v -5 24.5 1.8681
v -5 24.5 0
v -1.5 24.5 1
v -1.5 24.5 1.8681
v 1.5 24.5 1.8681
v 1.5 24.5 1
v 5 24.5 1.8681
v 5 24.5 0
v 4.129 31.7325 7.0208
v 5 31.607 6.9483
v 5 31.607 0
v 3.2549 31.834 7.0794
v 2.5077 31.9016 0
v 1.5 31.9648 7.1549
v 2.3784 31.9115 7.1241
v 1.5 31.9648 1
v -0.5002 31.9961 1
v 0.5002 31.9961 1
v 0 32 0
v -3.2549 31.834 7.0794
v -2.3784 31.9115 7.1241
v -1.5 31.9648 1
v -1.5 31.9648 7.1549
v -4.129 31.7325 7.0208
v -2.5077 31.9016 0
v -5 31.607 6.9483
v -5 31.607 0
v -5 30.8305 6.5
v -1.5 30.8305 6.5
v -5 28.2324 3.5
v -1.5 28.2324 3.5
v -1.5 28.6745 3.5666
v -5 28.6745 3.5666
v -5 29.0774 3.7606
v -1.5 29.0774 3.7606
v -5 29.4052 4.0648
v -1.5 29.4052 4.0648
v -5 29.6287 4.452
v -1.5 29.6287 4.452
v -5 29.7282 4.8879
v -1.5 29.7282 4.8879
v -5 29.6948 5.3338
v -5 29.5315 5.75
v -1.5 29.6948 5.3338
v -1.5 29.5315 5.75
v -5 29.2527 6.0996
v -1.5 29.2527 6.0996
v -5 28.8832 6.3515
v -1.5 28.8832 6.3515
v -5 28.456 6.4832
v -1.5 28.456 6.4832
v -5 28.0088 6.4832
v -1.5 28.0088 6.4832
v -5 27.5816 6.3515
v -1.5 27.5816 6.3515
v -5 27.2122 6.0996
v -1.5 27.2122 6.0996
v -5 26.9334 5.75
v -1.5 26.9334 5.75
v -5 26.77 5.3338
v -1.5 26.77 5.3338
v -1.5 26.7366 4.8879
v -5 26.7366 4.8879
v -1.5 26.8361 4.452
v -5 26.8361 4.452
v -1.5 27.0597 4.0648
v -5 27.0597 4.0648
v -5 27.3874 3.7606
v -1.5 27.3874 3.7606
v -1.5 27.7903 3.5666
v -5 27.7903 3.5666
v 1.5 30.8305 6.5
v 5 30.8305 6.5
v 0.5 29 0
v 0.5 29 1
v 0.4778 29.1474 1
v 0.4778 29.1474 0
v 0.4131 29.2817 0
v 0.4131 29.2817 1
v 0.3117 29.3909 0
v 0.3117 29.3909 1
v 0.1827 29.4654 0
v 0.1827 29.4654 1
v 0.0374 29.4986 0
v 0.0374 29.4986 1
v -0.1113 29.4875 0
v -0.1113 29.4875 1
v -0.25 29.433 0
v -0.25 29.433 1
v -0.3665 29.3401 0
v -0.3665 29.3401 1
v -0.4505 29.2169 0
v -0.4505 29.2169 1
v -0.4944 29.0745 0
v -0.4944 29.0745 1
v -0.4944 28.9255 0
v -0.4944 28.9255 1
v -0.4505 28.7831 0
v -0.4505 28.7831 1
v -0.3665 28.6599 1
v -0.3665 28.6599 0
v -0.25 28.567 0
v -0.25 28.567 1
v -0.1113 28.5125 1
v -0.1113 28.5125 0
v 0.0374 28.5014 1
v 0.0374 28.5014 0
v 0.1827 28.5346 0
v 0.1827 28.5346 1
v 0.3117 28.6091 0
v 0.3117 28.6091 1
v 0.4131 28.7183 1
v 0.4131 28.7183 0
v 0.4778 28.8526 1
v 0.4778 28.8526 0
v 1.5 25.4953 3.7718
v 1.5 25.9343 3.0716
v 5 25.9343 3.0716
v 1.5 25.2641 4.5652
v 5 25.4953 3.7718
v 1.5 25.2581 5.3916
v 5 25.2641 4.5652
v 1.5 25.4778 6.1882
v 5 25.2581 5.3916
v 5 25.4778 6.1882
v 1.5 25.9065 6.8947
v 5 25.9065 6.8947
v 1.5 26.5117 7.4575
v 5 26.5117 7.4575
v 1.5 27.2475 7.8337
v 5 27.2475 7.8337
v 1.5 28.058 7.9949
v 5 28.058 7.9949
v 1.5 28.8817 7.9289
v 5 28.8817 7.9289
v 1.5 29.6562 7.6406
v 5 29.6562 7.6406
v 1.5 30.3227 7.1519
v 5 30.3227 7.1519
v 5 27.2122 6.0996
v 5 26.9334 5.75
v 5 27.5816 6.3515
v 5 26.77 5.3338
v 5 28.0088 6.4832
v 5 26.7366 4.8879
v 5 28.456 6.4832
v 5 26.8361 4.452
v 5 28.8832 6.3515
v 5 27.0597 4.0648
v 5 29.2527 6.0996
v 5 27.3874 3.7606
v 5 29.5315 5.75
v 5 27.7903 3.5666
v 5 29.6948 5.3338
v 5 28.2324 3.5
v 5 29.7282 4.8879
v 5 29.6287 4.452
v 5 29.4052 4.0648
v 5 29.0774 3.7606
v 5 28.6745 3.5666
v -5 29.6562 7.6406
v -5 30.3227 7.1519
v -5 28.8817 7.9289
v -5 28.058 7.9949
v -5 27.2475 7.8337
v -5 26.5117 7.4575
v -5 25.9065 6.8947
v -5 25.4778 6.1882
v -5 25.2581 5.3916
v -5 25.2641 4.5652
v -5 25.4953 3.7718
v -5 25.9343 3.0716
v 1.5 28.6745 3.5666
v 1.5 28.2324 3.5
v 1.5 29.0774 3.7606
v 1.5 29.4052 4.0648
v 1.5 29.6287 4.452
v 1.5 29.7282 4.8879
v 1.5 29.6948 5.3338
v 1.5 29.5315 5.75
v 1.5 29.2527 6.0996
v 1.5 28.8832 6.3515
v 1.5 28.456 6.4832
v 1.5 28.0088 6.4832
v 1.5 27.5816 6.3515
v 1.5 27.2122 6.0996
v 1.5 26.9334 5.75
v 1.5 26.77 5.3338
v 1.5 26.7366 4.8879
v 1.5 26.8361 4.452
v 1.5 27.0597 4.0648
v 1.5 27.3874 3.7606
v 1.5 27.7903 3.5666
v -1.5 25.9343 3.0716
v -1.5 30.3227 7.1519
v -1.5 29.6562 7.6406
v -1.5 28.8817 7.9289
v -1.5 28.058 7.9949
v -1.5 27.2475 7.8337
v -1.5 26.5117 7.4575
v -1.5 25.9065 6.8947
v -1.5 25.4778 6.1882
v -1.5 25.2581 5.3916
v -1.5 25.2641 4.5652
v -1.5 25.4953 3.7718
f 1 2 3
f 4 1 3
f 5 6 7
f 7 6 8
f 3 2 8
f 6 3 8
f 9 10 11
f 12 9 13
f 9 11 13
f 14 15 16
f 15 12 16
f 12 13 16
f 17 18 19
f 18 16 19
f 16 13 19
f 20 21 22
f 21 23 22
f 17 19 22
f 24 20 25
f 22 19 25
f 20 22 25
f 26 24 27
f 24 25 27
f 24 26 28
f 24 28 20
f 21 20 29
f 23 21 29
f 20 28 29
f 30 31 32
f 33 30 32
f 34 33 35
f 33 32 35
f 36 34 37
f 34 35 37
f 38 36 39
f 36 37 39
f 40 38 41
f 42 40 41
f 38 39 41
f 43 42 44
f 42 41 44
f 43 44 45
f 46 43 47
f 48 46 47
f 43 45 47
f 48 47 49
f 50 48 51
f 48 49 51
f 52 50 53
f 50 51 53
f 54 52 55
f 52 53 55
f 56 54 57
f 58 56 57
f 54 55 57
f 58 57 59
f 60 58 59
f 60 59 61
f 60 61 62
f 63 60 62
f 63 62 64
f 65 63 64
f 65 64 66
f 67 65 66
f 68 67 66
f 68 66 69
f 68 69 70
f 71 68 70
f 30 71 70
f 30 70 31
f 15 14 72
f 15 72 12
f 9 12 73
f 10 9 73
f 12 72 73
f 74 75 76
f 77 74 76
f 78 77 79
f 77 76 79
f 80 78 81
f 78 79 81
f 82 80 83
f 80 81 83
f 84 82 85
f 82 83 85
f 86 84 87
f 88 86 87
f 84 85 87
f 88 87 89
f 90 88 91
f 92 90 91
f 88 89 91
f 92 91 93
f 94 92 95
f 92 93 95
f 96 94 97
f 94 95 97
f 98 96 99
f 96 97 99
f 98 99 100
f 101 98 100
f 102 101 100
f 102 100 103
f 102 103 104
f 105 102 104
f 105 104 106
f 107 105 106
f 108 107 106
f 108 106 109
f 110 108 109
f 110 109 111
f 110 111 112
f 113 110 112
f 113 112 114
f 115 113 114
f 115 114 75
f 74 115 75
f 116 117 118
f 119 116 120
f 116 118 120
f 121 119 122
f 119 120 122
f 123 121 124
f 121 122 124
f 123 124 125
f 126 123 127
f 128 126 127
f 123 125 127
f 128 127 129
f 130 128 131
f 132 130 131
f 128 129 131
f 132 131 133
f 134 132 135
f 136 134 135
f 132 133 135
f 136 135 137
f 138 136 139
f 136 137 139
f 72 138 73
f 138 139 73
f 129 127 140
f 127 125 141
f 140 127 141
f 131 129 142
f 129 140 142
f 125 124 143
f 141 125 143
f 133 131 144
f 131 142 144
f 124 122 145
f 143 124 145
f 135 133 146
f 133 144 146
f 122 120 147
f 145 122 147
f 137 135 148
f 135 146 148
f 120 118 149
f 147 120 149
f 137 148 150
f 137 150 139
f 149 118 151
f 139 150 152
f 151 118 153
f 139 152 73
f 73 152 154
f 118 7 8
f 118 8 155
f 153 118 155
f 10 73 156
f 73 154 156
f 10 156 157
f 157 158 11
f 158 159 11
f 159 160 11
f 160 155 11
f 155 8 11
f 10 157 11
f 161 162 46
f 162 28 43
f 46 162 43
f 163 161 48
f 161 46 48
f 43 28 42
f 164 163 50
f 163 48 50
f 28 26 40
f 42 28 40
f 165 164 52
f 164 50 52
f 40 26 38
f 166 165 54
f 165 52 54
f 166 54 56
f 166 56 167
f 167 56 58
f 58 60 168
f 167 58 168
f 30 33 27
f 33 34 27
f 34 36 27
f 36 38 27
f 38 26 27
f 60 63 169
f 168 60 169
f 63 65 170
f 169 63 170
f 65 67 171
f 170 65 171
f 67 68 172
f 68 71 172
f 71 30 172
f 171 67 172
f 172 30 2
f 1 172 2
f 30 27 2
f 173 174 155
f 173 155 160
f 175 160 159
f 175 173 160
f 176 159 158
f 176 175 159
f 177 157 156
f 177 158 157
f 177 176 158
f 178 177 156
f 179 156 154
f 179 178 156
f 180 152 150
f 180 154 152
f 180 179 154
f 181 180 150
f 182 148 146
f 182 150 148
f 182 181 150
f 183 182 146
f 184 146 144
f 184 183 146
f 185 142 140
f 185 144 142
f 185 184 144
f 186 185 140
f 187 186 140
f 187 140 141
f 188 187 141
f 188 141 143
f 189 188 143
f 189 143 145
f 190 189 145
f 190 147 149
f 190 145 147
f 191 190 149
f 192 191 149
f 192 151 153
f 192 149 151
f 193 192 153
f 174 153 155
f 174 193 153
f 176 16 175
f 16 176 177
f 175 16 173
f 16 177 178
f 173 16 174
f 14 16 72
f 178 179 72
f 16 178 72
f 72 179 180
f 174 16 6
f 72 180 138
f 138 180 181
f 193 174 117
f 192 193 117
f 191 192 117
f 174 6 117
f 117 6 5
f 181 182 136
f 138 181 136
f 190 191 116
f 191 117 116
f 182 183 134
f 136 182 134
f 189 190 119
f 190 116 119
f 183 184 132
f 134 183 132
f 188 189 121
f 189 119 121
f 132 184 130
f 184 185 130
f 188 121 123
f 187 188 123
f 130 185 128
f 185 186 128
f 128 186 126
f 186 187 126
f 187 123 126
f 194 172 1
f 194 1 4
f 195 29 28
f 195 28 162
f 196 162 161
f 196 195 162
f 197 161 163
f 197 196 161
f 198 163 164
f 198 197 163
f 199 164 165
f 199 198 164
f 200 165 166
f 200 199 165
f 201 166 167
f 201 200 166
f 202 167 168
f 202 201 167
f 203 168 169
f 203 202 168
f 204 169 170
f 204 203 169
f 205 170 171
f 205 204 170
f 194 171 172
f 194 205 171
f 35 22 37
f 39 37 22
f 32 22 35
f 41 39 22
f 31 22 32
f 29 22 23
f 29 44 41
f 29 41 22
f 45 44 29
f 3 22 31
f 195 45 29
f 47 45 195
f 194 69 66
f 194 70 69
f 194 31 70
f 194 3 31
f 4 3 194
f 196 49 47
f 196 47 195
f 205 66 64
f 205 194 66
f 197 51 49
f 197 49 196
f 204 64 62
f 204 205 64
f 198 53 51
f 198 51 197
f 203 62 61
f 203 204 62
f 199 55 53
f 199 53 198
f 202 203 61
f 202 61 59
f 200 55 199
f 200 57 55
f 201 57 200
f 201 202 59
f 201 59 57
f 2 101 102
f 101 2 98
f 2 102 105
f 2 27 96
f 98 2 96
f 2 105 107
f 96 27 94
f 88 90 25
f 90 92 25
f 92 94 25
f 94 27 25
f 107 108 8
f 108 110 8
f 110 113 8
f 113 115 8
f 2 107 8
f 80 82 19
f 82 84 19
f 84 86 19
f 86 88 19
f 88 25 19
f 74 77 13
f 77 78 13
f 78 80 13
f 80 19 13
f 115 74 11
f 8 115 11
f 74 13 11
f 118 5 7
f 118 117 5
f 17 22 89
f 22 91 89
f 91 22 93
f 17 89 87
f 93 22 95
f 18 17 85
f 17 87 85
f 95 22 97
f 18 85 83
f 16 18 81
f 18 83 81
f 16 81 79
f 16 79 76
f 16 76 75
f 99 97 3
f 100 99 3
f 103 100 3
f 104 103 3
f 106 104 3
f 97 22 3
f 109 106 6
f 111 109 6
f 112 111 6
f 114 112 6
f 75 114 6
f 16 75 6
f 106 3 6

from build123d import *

# Parameters (mm, degrees)
SALIENTE_EXTRUIR1_DEPTH            = 8
CROQUIS2_W                         = 3
CROQUIS2_H                         = 7
CORTAR_EXTRUIR1_DEPTH              = 10
CORTAR_EXTRUIR3_REACH              = 35.619
CROQUIS3_R                         = 1.5
CORTAR_EXTRUIR3_DIRECTION_2_REACH  = 35.619
CROQUIS6_W                         = 10
CROQUIS6_H                         = 7
CORTAR_REVOLUCI_N4_ANGLE           = 130
CORTAR_REVOLUCI_N4_OTHER_WAY_ANGLE = 60
CROQUIS7_R                         = 0.5
CORTAR_EXTRUIR4_DEPTH              = 10


with BuildPart() as part:
    # Croquis1 → Saliente-Extruir1 (new body)
    with BuildSketch(Plane.XY):
        with BuildLine():
            Line((-5, 31.606961259), (-5, 24.5))
            Line((-5, 24.5), (5, 24.5))
            Line((5, 24.5), (5, 31.606961259))
            ThreePointArc((5, 31.606961259), (0, 32), (-5, 31.606961259))
        make_face()
    extrude(amount=SALIENTE_EXTRUIR1_DEPTH)

    # Croquis2 → Cortar-Extruir1 (cut)
    with BuildSketch(Plane.XZ.offset(-24.5)):
        with Locations((0, 4.5)):
            Rectangle(CROQUIS2_W, CROQUIS2_H)
    extrude(amount=-CORTAR_EXTRUIR1_DEPTH, mode=Mode.SUBTRACT)

    # Cortar-Extruir3: up to this face of the body (flat: up to its plane)
    cortar_extruir3_end = Plane(part.part.faces().sort_by_distance((-5, 28.053480629, 4))[0])
    # Croquis3 → Cortar-Extruir3 (cut, up to the picked face)
    with BuildSketch(Plane(origin=(-1.5, 0, 0), x_dir=(0, 0, -1), z_dir=(1, 0, 0)), mode=Mode.PRIVATE) as cortar_extruir3_sk1:
        with Locations((-5, 28.232412208)):
            Circle(CROQUIS3_R)
    cortar_extruir3_tool1 = split(extrude(cortar_extruir3_sk1.sketch, amount=-CORTAR_EXTRUIR3_REACH, mode=Mode.PRIVATE), bisect_by=cortar_extruir3_end, keep=Keep.BOTH, mode=Mode.PRIVATE)
    add(cortar_extruir3_tool1.solids().sort_by(Axis((-1.5, 28.232412, 5), (-1, 0, 0)))[0], mode=Mode.SUBTRACT)

    # Cortar-Extruir3 direction 2: up to this face of the body (flat: up to its plane)
    cortar_extruir3_direction_2_end = Plane(part.part.faces().sort_by_distance((5, 28.053480629, 4))[0])
    # Croquis3 → Cortar-Extruir3 direction 2 (cut, up to the picked face)
    with BuildSketch(Plane(origin=(-1.5, 0, 0), x_dir=(0, 0, -1), z_dir=(1, 0, 0)), mode=Mode.PRIVATE) as cortar_extruir3_direction_2_sk1:
        with Locations((-5, 28.232412208)):
            Circle(CROQUIS3_R)
    cortar_extruir3_direction_2_tool1 = split(extrude(cortar_extruir3_direction_2_sk1.sketch, amount=CORTAR_EXTRUIR3_DIRECTION_2_REACH, mode=Mode.PRIVATE), bisect_by=cortar_extruir3_direction_2_end, keep=Keep.BOTH, mode=Mode.PRIVATE)
    add(cortar_extruir3_direction_2_tool1.solids().sort_by(Axis((-1.5, 28.232412, 5), (1, 0, 0)))[0], mode=Mode.SUBTRACT)

    # Croquis6 → Cortar-Revolución4 (revolve, cut)
    with BuildSketch(Plane(origin=(0, 28.232412208, 0), x_dir=(1, 0, 0), z_dir=(0, 1, 0))):
        with Locations((0, -11.5)):
            Rectangle(CROQUIS6_W, CROQUIS6_H)
    revolve(axis=Axis((1.5, 28.232412208, 5), (1, 0, 0)), revolution_arc=CORTAR_REVOLUCI_N4_ANGLE, mode=Mode.SUBTRACT)

    # Croquis6 → Cortar-Revolución4 other way (revolve, cut)
    with BuildSketch(Plane(origin=(0, 28.232412208, 0), x_dir=(1, 0, 0), z_dir=(0, 1, 0))):
        with Locations((0, -11.5)):
            Rectangle(CROQUIS6_W, CROQUIS6_H)
    revolve(axis=Axis((1.5, 28.232412208, 5), (-1, 0, 0)), revolution_arc=CORTAR_REVOLUCI_N4_OTHER_WAY_ANGLE, mode=Mode.SUBTRACT)

    # Croquis7 → Cortar-Extruir4 (cut)
    with BuildSketch(Plane.XY.offset(1)):
        with Locations((0, 29)):
            Circle(CROQUIS7_R)
    extrude(amount=-CORTAR_EXTRUIR4_DEPTH, mode=Mode.SUBTRACT)


solid = part.part
